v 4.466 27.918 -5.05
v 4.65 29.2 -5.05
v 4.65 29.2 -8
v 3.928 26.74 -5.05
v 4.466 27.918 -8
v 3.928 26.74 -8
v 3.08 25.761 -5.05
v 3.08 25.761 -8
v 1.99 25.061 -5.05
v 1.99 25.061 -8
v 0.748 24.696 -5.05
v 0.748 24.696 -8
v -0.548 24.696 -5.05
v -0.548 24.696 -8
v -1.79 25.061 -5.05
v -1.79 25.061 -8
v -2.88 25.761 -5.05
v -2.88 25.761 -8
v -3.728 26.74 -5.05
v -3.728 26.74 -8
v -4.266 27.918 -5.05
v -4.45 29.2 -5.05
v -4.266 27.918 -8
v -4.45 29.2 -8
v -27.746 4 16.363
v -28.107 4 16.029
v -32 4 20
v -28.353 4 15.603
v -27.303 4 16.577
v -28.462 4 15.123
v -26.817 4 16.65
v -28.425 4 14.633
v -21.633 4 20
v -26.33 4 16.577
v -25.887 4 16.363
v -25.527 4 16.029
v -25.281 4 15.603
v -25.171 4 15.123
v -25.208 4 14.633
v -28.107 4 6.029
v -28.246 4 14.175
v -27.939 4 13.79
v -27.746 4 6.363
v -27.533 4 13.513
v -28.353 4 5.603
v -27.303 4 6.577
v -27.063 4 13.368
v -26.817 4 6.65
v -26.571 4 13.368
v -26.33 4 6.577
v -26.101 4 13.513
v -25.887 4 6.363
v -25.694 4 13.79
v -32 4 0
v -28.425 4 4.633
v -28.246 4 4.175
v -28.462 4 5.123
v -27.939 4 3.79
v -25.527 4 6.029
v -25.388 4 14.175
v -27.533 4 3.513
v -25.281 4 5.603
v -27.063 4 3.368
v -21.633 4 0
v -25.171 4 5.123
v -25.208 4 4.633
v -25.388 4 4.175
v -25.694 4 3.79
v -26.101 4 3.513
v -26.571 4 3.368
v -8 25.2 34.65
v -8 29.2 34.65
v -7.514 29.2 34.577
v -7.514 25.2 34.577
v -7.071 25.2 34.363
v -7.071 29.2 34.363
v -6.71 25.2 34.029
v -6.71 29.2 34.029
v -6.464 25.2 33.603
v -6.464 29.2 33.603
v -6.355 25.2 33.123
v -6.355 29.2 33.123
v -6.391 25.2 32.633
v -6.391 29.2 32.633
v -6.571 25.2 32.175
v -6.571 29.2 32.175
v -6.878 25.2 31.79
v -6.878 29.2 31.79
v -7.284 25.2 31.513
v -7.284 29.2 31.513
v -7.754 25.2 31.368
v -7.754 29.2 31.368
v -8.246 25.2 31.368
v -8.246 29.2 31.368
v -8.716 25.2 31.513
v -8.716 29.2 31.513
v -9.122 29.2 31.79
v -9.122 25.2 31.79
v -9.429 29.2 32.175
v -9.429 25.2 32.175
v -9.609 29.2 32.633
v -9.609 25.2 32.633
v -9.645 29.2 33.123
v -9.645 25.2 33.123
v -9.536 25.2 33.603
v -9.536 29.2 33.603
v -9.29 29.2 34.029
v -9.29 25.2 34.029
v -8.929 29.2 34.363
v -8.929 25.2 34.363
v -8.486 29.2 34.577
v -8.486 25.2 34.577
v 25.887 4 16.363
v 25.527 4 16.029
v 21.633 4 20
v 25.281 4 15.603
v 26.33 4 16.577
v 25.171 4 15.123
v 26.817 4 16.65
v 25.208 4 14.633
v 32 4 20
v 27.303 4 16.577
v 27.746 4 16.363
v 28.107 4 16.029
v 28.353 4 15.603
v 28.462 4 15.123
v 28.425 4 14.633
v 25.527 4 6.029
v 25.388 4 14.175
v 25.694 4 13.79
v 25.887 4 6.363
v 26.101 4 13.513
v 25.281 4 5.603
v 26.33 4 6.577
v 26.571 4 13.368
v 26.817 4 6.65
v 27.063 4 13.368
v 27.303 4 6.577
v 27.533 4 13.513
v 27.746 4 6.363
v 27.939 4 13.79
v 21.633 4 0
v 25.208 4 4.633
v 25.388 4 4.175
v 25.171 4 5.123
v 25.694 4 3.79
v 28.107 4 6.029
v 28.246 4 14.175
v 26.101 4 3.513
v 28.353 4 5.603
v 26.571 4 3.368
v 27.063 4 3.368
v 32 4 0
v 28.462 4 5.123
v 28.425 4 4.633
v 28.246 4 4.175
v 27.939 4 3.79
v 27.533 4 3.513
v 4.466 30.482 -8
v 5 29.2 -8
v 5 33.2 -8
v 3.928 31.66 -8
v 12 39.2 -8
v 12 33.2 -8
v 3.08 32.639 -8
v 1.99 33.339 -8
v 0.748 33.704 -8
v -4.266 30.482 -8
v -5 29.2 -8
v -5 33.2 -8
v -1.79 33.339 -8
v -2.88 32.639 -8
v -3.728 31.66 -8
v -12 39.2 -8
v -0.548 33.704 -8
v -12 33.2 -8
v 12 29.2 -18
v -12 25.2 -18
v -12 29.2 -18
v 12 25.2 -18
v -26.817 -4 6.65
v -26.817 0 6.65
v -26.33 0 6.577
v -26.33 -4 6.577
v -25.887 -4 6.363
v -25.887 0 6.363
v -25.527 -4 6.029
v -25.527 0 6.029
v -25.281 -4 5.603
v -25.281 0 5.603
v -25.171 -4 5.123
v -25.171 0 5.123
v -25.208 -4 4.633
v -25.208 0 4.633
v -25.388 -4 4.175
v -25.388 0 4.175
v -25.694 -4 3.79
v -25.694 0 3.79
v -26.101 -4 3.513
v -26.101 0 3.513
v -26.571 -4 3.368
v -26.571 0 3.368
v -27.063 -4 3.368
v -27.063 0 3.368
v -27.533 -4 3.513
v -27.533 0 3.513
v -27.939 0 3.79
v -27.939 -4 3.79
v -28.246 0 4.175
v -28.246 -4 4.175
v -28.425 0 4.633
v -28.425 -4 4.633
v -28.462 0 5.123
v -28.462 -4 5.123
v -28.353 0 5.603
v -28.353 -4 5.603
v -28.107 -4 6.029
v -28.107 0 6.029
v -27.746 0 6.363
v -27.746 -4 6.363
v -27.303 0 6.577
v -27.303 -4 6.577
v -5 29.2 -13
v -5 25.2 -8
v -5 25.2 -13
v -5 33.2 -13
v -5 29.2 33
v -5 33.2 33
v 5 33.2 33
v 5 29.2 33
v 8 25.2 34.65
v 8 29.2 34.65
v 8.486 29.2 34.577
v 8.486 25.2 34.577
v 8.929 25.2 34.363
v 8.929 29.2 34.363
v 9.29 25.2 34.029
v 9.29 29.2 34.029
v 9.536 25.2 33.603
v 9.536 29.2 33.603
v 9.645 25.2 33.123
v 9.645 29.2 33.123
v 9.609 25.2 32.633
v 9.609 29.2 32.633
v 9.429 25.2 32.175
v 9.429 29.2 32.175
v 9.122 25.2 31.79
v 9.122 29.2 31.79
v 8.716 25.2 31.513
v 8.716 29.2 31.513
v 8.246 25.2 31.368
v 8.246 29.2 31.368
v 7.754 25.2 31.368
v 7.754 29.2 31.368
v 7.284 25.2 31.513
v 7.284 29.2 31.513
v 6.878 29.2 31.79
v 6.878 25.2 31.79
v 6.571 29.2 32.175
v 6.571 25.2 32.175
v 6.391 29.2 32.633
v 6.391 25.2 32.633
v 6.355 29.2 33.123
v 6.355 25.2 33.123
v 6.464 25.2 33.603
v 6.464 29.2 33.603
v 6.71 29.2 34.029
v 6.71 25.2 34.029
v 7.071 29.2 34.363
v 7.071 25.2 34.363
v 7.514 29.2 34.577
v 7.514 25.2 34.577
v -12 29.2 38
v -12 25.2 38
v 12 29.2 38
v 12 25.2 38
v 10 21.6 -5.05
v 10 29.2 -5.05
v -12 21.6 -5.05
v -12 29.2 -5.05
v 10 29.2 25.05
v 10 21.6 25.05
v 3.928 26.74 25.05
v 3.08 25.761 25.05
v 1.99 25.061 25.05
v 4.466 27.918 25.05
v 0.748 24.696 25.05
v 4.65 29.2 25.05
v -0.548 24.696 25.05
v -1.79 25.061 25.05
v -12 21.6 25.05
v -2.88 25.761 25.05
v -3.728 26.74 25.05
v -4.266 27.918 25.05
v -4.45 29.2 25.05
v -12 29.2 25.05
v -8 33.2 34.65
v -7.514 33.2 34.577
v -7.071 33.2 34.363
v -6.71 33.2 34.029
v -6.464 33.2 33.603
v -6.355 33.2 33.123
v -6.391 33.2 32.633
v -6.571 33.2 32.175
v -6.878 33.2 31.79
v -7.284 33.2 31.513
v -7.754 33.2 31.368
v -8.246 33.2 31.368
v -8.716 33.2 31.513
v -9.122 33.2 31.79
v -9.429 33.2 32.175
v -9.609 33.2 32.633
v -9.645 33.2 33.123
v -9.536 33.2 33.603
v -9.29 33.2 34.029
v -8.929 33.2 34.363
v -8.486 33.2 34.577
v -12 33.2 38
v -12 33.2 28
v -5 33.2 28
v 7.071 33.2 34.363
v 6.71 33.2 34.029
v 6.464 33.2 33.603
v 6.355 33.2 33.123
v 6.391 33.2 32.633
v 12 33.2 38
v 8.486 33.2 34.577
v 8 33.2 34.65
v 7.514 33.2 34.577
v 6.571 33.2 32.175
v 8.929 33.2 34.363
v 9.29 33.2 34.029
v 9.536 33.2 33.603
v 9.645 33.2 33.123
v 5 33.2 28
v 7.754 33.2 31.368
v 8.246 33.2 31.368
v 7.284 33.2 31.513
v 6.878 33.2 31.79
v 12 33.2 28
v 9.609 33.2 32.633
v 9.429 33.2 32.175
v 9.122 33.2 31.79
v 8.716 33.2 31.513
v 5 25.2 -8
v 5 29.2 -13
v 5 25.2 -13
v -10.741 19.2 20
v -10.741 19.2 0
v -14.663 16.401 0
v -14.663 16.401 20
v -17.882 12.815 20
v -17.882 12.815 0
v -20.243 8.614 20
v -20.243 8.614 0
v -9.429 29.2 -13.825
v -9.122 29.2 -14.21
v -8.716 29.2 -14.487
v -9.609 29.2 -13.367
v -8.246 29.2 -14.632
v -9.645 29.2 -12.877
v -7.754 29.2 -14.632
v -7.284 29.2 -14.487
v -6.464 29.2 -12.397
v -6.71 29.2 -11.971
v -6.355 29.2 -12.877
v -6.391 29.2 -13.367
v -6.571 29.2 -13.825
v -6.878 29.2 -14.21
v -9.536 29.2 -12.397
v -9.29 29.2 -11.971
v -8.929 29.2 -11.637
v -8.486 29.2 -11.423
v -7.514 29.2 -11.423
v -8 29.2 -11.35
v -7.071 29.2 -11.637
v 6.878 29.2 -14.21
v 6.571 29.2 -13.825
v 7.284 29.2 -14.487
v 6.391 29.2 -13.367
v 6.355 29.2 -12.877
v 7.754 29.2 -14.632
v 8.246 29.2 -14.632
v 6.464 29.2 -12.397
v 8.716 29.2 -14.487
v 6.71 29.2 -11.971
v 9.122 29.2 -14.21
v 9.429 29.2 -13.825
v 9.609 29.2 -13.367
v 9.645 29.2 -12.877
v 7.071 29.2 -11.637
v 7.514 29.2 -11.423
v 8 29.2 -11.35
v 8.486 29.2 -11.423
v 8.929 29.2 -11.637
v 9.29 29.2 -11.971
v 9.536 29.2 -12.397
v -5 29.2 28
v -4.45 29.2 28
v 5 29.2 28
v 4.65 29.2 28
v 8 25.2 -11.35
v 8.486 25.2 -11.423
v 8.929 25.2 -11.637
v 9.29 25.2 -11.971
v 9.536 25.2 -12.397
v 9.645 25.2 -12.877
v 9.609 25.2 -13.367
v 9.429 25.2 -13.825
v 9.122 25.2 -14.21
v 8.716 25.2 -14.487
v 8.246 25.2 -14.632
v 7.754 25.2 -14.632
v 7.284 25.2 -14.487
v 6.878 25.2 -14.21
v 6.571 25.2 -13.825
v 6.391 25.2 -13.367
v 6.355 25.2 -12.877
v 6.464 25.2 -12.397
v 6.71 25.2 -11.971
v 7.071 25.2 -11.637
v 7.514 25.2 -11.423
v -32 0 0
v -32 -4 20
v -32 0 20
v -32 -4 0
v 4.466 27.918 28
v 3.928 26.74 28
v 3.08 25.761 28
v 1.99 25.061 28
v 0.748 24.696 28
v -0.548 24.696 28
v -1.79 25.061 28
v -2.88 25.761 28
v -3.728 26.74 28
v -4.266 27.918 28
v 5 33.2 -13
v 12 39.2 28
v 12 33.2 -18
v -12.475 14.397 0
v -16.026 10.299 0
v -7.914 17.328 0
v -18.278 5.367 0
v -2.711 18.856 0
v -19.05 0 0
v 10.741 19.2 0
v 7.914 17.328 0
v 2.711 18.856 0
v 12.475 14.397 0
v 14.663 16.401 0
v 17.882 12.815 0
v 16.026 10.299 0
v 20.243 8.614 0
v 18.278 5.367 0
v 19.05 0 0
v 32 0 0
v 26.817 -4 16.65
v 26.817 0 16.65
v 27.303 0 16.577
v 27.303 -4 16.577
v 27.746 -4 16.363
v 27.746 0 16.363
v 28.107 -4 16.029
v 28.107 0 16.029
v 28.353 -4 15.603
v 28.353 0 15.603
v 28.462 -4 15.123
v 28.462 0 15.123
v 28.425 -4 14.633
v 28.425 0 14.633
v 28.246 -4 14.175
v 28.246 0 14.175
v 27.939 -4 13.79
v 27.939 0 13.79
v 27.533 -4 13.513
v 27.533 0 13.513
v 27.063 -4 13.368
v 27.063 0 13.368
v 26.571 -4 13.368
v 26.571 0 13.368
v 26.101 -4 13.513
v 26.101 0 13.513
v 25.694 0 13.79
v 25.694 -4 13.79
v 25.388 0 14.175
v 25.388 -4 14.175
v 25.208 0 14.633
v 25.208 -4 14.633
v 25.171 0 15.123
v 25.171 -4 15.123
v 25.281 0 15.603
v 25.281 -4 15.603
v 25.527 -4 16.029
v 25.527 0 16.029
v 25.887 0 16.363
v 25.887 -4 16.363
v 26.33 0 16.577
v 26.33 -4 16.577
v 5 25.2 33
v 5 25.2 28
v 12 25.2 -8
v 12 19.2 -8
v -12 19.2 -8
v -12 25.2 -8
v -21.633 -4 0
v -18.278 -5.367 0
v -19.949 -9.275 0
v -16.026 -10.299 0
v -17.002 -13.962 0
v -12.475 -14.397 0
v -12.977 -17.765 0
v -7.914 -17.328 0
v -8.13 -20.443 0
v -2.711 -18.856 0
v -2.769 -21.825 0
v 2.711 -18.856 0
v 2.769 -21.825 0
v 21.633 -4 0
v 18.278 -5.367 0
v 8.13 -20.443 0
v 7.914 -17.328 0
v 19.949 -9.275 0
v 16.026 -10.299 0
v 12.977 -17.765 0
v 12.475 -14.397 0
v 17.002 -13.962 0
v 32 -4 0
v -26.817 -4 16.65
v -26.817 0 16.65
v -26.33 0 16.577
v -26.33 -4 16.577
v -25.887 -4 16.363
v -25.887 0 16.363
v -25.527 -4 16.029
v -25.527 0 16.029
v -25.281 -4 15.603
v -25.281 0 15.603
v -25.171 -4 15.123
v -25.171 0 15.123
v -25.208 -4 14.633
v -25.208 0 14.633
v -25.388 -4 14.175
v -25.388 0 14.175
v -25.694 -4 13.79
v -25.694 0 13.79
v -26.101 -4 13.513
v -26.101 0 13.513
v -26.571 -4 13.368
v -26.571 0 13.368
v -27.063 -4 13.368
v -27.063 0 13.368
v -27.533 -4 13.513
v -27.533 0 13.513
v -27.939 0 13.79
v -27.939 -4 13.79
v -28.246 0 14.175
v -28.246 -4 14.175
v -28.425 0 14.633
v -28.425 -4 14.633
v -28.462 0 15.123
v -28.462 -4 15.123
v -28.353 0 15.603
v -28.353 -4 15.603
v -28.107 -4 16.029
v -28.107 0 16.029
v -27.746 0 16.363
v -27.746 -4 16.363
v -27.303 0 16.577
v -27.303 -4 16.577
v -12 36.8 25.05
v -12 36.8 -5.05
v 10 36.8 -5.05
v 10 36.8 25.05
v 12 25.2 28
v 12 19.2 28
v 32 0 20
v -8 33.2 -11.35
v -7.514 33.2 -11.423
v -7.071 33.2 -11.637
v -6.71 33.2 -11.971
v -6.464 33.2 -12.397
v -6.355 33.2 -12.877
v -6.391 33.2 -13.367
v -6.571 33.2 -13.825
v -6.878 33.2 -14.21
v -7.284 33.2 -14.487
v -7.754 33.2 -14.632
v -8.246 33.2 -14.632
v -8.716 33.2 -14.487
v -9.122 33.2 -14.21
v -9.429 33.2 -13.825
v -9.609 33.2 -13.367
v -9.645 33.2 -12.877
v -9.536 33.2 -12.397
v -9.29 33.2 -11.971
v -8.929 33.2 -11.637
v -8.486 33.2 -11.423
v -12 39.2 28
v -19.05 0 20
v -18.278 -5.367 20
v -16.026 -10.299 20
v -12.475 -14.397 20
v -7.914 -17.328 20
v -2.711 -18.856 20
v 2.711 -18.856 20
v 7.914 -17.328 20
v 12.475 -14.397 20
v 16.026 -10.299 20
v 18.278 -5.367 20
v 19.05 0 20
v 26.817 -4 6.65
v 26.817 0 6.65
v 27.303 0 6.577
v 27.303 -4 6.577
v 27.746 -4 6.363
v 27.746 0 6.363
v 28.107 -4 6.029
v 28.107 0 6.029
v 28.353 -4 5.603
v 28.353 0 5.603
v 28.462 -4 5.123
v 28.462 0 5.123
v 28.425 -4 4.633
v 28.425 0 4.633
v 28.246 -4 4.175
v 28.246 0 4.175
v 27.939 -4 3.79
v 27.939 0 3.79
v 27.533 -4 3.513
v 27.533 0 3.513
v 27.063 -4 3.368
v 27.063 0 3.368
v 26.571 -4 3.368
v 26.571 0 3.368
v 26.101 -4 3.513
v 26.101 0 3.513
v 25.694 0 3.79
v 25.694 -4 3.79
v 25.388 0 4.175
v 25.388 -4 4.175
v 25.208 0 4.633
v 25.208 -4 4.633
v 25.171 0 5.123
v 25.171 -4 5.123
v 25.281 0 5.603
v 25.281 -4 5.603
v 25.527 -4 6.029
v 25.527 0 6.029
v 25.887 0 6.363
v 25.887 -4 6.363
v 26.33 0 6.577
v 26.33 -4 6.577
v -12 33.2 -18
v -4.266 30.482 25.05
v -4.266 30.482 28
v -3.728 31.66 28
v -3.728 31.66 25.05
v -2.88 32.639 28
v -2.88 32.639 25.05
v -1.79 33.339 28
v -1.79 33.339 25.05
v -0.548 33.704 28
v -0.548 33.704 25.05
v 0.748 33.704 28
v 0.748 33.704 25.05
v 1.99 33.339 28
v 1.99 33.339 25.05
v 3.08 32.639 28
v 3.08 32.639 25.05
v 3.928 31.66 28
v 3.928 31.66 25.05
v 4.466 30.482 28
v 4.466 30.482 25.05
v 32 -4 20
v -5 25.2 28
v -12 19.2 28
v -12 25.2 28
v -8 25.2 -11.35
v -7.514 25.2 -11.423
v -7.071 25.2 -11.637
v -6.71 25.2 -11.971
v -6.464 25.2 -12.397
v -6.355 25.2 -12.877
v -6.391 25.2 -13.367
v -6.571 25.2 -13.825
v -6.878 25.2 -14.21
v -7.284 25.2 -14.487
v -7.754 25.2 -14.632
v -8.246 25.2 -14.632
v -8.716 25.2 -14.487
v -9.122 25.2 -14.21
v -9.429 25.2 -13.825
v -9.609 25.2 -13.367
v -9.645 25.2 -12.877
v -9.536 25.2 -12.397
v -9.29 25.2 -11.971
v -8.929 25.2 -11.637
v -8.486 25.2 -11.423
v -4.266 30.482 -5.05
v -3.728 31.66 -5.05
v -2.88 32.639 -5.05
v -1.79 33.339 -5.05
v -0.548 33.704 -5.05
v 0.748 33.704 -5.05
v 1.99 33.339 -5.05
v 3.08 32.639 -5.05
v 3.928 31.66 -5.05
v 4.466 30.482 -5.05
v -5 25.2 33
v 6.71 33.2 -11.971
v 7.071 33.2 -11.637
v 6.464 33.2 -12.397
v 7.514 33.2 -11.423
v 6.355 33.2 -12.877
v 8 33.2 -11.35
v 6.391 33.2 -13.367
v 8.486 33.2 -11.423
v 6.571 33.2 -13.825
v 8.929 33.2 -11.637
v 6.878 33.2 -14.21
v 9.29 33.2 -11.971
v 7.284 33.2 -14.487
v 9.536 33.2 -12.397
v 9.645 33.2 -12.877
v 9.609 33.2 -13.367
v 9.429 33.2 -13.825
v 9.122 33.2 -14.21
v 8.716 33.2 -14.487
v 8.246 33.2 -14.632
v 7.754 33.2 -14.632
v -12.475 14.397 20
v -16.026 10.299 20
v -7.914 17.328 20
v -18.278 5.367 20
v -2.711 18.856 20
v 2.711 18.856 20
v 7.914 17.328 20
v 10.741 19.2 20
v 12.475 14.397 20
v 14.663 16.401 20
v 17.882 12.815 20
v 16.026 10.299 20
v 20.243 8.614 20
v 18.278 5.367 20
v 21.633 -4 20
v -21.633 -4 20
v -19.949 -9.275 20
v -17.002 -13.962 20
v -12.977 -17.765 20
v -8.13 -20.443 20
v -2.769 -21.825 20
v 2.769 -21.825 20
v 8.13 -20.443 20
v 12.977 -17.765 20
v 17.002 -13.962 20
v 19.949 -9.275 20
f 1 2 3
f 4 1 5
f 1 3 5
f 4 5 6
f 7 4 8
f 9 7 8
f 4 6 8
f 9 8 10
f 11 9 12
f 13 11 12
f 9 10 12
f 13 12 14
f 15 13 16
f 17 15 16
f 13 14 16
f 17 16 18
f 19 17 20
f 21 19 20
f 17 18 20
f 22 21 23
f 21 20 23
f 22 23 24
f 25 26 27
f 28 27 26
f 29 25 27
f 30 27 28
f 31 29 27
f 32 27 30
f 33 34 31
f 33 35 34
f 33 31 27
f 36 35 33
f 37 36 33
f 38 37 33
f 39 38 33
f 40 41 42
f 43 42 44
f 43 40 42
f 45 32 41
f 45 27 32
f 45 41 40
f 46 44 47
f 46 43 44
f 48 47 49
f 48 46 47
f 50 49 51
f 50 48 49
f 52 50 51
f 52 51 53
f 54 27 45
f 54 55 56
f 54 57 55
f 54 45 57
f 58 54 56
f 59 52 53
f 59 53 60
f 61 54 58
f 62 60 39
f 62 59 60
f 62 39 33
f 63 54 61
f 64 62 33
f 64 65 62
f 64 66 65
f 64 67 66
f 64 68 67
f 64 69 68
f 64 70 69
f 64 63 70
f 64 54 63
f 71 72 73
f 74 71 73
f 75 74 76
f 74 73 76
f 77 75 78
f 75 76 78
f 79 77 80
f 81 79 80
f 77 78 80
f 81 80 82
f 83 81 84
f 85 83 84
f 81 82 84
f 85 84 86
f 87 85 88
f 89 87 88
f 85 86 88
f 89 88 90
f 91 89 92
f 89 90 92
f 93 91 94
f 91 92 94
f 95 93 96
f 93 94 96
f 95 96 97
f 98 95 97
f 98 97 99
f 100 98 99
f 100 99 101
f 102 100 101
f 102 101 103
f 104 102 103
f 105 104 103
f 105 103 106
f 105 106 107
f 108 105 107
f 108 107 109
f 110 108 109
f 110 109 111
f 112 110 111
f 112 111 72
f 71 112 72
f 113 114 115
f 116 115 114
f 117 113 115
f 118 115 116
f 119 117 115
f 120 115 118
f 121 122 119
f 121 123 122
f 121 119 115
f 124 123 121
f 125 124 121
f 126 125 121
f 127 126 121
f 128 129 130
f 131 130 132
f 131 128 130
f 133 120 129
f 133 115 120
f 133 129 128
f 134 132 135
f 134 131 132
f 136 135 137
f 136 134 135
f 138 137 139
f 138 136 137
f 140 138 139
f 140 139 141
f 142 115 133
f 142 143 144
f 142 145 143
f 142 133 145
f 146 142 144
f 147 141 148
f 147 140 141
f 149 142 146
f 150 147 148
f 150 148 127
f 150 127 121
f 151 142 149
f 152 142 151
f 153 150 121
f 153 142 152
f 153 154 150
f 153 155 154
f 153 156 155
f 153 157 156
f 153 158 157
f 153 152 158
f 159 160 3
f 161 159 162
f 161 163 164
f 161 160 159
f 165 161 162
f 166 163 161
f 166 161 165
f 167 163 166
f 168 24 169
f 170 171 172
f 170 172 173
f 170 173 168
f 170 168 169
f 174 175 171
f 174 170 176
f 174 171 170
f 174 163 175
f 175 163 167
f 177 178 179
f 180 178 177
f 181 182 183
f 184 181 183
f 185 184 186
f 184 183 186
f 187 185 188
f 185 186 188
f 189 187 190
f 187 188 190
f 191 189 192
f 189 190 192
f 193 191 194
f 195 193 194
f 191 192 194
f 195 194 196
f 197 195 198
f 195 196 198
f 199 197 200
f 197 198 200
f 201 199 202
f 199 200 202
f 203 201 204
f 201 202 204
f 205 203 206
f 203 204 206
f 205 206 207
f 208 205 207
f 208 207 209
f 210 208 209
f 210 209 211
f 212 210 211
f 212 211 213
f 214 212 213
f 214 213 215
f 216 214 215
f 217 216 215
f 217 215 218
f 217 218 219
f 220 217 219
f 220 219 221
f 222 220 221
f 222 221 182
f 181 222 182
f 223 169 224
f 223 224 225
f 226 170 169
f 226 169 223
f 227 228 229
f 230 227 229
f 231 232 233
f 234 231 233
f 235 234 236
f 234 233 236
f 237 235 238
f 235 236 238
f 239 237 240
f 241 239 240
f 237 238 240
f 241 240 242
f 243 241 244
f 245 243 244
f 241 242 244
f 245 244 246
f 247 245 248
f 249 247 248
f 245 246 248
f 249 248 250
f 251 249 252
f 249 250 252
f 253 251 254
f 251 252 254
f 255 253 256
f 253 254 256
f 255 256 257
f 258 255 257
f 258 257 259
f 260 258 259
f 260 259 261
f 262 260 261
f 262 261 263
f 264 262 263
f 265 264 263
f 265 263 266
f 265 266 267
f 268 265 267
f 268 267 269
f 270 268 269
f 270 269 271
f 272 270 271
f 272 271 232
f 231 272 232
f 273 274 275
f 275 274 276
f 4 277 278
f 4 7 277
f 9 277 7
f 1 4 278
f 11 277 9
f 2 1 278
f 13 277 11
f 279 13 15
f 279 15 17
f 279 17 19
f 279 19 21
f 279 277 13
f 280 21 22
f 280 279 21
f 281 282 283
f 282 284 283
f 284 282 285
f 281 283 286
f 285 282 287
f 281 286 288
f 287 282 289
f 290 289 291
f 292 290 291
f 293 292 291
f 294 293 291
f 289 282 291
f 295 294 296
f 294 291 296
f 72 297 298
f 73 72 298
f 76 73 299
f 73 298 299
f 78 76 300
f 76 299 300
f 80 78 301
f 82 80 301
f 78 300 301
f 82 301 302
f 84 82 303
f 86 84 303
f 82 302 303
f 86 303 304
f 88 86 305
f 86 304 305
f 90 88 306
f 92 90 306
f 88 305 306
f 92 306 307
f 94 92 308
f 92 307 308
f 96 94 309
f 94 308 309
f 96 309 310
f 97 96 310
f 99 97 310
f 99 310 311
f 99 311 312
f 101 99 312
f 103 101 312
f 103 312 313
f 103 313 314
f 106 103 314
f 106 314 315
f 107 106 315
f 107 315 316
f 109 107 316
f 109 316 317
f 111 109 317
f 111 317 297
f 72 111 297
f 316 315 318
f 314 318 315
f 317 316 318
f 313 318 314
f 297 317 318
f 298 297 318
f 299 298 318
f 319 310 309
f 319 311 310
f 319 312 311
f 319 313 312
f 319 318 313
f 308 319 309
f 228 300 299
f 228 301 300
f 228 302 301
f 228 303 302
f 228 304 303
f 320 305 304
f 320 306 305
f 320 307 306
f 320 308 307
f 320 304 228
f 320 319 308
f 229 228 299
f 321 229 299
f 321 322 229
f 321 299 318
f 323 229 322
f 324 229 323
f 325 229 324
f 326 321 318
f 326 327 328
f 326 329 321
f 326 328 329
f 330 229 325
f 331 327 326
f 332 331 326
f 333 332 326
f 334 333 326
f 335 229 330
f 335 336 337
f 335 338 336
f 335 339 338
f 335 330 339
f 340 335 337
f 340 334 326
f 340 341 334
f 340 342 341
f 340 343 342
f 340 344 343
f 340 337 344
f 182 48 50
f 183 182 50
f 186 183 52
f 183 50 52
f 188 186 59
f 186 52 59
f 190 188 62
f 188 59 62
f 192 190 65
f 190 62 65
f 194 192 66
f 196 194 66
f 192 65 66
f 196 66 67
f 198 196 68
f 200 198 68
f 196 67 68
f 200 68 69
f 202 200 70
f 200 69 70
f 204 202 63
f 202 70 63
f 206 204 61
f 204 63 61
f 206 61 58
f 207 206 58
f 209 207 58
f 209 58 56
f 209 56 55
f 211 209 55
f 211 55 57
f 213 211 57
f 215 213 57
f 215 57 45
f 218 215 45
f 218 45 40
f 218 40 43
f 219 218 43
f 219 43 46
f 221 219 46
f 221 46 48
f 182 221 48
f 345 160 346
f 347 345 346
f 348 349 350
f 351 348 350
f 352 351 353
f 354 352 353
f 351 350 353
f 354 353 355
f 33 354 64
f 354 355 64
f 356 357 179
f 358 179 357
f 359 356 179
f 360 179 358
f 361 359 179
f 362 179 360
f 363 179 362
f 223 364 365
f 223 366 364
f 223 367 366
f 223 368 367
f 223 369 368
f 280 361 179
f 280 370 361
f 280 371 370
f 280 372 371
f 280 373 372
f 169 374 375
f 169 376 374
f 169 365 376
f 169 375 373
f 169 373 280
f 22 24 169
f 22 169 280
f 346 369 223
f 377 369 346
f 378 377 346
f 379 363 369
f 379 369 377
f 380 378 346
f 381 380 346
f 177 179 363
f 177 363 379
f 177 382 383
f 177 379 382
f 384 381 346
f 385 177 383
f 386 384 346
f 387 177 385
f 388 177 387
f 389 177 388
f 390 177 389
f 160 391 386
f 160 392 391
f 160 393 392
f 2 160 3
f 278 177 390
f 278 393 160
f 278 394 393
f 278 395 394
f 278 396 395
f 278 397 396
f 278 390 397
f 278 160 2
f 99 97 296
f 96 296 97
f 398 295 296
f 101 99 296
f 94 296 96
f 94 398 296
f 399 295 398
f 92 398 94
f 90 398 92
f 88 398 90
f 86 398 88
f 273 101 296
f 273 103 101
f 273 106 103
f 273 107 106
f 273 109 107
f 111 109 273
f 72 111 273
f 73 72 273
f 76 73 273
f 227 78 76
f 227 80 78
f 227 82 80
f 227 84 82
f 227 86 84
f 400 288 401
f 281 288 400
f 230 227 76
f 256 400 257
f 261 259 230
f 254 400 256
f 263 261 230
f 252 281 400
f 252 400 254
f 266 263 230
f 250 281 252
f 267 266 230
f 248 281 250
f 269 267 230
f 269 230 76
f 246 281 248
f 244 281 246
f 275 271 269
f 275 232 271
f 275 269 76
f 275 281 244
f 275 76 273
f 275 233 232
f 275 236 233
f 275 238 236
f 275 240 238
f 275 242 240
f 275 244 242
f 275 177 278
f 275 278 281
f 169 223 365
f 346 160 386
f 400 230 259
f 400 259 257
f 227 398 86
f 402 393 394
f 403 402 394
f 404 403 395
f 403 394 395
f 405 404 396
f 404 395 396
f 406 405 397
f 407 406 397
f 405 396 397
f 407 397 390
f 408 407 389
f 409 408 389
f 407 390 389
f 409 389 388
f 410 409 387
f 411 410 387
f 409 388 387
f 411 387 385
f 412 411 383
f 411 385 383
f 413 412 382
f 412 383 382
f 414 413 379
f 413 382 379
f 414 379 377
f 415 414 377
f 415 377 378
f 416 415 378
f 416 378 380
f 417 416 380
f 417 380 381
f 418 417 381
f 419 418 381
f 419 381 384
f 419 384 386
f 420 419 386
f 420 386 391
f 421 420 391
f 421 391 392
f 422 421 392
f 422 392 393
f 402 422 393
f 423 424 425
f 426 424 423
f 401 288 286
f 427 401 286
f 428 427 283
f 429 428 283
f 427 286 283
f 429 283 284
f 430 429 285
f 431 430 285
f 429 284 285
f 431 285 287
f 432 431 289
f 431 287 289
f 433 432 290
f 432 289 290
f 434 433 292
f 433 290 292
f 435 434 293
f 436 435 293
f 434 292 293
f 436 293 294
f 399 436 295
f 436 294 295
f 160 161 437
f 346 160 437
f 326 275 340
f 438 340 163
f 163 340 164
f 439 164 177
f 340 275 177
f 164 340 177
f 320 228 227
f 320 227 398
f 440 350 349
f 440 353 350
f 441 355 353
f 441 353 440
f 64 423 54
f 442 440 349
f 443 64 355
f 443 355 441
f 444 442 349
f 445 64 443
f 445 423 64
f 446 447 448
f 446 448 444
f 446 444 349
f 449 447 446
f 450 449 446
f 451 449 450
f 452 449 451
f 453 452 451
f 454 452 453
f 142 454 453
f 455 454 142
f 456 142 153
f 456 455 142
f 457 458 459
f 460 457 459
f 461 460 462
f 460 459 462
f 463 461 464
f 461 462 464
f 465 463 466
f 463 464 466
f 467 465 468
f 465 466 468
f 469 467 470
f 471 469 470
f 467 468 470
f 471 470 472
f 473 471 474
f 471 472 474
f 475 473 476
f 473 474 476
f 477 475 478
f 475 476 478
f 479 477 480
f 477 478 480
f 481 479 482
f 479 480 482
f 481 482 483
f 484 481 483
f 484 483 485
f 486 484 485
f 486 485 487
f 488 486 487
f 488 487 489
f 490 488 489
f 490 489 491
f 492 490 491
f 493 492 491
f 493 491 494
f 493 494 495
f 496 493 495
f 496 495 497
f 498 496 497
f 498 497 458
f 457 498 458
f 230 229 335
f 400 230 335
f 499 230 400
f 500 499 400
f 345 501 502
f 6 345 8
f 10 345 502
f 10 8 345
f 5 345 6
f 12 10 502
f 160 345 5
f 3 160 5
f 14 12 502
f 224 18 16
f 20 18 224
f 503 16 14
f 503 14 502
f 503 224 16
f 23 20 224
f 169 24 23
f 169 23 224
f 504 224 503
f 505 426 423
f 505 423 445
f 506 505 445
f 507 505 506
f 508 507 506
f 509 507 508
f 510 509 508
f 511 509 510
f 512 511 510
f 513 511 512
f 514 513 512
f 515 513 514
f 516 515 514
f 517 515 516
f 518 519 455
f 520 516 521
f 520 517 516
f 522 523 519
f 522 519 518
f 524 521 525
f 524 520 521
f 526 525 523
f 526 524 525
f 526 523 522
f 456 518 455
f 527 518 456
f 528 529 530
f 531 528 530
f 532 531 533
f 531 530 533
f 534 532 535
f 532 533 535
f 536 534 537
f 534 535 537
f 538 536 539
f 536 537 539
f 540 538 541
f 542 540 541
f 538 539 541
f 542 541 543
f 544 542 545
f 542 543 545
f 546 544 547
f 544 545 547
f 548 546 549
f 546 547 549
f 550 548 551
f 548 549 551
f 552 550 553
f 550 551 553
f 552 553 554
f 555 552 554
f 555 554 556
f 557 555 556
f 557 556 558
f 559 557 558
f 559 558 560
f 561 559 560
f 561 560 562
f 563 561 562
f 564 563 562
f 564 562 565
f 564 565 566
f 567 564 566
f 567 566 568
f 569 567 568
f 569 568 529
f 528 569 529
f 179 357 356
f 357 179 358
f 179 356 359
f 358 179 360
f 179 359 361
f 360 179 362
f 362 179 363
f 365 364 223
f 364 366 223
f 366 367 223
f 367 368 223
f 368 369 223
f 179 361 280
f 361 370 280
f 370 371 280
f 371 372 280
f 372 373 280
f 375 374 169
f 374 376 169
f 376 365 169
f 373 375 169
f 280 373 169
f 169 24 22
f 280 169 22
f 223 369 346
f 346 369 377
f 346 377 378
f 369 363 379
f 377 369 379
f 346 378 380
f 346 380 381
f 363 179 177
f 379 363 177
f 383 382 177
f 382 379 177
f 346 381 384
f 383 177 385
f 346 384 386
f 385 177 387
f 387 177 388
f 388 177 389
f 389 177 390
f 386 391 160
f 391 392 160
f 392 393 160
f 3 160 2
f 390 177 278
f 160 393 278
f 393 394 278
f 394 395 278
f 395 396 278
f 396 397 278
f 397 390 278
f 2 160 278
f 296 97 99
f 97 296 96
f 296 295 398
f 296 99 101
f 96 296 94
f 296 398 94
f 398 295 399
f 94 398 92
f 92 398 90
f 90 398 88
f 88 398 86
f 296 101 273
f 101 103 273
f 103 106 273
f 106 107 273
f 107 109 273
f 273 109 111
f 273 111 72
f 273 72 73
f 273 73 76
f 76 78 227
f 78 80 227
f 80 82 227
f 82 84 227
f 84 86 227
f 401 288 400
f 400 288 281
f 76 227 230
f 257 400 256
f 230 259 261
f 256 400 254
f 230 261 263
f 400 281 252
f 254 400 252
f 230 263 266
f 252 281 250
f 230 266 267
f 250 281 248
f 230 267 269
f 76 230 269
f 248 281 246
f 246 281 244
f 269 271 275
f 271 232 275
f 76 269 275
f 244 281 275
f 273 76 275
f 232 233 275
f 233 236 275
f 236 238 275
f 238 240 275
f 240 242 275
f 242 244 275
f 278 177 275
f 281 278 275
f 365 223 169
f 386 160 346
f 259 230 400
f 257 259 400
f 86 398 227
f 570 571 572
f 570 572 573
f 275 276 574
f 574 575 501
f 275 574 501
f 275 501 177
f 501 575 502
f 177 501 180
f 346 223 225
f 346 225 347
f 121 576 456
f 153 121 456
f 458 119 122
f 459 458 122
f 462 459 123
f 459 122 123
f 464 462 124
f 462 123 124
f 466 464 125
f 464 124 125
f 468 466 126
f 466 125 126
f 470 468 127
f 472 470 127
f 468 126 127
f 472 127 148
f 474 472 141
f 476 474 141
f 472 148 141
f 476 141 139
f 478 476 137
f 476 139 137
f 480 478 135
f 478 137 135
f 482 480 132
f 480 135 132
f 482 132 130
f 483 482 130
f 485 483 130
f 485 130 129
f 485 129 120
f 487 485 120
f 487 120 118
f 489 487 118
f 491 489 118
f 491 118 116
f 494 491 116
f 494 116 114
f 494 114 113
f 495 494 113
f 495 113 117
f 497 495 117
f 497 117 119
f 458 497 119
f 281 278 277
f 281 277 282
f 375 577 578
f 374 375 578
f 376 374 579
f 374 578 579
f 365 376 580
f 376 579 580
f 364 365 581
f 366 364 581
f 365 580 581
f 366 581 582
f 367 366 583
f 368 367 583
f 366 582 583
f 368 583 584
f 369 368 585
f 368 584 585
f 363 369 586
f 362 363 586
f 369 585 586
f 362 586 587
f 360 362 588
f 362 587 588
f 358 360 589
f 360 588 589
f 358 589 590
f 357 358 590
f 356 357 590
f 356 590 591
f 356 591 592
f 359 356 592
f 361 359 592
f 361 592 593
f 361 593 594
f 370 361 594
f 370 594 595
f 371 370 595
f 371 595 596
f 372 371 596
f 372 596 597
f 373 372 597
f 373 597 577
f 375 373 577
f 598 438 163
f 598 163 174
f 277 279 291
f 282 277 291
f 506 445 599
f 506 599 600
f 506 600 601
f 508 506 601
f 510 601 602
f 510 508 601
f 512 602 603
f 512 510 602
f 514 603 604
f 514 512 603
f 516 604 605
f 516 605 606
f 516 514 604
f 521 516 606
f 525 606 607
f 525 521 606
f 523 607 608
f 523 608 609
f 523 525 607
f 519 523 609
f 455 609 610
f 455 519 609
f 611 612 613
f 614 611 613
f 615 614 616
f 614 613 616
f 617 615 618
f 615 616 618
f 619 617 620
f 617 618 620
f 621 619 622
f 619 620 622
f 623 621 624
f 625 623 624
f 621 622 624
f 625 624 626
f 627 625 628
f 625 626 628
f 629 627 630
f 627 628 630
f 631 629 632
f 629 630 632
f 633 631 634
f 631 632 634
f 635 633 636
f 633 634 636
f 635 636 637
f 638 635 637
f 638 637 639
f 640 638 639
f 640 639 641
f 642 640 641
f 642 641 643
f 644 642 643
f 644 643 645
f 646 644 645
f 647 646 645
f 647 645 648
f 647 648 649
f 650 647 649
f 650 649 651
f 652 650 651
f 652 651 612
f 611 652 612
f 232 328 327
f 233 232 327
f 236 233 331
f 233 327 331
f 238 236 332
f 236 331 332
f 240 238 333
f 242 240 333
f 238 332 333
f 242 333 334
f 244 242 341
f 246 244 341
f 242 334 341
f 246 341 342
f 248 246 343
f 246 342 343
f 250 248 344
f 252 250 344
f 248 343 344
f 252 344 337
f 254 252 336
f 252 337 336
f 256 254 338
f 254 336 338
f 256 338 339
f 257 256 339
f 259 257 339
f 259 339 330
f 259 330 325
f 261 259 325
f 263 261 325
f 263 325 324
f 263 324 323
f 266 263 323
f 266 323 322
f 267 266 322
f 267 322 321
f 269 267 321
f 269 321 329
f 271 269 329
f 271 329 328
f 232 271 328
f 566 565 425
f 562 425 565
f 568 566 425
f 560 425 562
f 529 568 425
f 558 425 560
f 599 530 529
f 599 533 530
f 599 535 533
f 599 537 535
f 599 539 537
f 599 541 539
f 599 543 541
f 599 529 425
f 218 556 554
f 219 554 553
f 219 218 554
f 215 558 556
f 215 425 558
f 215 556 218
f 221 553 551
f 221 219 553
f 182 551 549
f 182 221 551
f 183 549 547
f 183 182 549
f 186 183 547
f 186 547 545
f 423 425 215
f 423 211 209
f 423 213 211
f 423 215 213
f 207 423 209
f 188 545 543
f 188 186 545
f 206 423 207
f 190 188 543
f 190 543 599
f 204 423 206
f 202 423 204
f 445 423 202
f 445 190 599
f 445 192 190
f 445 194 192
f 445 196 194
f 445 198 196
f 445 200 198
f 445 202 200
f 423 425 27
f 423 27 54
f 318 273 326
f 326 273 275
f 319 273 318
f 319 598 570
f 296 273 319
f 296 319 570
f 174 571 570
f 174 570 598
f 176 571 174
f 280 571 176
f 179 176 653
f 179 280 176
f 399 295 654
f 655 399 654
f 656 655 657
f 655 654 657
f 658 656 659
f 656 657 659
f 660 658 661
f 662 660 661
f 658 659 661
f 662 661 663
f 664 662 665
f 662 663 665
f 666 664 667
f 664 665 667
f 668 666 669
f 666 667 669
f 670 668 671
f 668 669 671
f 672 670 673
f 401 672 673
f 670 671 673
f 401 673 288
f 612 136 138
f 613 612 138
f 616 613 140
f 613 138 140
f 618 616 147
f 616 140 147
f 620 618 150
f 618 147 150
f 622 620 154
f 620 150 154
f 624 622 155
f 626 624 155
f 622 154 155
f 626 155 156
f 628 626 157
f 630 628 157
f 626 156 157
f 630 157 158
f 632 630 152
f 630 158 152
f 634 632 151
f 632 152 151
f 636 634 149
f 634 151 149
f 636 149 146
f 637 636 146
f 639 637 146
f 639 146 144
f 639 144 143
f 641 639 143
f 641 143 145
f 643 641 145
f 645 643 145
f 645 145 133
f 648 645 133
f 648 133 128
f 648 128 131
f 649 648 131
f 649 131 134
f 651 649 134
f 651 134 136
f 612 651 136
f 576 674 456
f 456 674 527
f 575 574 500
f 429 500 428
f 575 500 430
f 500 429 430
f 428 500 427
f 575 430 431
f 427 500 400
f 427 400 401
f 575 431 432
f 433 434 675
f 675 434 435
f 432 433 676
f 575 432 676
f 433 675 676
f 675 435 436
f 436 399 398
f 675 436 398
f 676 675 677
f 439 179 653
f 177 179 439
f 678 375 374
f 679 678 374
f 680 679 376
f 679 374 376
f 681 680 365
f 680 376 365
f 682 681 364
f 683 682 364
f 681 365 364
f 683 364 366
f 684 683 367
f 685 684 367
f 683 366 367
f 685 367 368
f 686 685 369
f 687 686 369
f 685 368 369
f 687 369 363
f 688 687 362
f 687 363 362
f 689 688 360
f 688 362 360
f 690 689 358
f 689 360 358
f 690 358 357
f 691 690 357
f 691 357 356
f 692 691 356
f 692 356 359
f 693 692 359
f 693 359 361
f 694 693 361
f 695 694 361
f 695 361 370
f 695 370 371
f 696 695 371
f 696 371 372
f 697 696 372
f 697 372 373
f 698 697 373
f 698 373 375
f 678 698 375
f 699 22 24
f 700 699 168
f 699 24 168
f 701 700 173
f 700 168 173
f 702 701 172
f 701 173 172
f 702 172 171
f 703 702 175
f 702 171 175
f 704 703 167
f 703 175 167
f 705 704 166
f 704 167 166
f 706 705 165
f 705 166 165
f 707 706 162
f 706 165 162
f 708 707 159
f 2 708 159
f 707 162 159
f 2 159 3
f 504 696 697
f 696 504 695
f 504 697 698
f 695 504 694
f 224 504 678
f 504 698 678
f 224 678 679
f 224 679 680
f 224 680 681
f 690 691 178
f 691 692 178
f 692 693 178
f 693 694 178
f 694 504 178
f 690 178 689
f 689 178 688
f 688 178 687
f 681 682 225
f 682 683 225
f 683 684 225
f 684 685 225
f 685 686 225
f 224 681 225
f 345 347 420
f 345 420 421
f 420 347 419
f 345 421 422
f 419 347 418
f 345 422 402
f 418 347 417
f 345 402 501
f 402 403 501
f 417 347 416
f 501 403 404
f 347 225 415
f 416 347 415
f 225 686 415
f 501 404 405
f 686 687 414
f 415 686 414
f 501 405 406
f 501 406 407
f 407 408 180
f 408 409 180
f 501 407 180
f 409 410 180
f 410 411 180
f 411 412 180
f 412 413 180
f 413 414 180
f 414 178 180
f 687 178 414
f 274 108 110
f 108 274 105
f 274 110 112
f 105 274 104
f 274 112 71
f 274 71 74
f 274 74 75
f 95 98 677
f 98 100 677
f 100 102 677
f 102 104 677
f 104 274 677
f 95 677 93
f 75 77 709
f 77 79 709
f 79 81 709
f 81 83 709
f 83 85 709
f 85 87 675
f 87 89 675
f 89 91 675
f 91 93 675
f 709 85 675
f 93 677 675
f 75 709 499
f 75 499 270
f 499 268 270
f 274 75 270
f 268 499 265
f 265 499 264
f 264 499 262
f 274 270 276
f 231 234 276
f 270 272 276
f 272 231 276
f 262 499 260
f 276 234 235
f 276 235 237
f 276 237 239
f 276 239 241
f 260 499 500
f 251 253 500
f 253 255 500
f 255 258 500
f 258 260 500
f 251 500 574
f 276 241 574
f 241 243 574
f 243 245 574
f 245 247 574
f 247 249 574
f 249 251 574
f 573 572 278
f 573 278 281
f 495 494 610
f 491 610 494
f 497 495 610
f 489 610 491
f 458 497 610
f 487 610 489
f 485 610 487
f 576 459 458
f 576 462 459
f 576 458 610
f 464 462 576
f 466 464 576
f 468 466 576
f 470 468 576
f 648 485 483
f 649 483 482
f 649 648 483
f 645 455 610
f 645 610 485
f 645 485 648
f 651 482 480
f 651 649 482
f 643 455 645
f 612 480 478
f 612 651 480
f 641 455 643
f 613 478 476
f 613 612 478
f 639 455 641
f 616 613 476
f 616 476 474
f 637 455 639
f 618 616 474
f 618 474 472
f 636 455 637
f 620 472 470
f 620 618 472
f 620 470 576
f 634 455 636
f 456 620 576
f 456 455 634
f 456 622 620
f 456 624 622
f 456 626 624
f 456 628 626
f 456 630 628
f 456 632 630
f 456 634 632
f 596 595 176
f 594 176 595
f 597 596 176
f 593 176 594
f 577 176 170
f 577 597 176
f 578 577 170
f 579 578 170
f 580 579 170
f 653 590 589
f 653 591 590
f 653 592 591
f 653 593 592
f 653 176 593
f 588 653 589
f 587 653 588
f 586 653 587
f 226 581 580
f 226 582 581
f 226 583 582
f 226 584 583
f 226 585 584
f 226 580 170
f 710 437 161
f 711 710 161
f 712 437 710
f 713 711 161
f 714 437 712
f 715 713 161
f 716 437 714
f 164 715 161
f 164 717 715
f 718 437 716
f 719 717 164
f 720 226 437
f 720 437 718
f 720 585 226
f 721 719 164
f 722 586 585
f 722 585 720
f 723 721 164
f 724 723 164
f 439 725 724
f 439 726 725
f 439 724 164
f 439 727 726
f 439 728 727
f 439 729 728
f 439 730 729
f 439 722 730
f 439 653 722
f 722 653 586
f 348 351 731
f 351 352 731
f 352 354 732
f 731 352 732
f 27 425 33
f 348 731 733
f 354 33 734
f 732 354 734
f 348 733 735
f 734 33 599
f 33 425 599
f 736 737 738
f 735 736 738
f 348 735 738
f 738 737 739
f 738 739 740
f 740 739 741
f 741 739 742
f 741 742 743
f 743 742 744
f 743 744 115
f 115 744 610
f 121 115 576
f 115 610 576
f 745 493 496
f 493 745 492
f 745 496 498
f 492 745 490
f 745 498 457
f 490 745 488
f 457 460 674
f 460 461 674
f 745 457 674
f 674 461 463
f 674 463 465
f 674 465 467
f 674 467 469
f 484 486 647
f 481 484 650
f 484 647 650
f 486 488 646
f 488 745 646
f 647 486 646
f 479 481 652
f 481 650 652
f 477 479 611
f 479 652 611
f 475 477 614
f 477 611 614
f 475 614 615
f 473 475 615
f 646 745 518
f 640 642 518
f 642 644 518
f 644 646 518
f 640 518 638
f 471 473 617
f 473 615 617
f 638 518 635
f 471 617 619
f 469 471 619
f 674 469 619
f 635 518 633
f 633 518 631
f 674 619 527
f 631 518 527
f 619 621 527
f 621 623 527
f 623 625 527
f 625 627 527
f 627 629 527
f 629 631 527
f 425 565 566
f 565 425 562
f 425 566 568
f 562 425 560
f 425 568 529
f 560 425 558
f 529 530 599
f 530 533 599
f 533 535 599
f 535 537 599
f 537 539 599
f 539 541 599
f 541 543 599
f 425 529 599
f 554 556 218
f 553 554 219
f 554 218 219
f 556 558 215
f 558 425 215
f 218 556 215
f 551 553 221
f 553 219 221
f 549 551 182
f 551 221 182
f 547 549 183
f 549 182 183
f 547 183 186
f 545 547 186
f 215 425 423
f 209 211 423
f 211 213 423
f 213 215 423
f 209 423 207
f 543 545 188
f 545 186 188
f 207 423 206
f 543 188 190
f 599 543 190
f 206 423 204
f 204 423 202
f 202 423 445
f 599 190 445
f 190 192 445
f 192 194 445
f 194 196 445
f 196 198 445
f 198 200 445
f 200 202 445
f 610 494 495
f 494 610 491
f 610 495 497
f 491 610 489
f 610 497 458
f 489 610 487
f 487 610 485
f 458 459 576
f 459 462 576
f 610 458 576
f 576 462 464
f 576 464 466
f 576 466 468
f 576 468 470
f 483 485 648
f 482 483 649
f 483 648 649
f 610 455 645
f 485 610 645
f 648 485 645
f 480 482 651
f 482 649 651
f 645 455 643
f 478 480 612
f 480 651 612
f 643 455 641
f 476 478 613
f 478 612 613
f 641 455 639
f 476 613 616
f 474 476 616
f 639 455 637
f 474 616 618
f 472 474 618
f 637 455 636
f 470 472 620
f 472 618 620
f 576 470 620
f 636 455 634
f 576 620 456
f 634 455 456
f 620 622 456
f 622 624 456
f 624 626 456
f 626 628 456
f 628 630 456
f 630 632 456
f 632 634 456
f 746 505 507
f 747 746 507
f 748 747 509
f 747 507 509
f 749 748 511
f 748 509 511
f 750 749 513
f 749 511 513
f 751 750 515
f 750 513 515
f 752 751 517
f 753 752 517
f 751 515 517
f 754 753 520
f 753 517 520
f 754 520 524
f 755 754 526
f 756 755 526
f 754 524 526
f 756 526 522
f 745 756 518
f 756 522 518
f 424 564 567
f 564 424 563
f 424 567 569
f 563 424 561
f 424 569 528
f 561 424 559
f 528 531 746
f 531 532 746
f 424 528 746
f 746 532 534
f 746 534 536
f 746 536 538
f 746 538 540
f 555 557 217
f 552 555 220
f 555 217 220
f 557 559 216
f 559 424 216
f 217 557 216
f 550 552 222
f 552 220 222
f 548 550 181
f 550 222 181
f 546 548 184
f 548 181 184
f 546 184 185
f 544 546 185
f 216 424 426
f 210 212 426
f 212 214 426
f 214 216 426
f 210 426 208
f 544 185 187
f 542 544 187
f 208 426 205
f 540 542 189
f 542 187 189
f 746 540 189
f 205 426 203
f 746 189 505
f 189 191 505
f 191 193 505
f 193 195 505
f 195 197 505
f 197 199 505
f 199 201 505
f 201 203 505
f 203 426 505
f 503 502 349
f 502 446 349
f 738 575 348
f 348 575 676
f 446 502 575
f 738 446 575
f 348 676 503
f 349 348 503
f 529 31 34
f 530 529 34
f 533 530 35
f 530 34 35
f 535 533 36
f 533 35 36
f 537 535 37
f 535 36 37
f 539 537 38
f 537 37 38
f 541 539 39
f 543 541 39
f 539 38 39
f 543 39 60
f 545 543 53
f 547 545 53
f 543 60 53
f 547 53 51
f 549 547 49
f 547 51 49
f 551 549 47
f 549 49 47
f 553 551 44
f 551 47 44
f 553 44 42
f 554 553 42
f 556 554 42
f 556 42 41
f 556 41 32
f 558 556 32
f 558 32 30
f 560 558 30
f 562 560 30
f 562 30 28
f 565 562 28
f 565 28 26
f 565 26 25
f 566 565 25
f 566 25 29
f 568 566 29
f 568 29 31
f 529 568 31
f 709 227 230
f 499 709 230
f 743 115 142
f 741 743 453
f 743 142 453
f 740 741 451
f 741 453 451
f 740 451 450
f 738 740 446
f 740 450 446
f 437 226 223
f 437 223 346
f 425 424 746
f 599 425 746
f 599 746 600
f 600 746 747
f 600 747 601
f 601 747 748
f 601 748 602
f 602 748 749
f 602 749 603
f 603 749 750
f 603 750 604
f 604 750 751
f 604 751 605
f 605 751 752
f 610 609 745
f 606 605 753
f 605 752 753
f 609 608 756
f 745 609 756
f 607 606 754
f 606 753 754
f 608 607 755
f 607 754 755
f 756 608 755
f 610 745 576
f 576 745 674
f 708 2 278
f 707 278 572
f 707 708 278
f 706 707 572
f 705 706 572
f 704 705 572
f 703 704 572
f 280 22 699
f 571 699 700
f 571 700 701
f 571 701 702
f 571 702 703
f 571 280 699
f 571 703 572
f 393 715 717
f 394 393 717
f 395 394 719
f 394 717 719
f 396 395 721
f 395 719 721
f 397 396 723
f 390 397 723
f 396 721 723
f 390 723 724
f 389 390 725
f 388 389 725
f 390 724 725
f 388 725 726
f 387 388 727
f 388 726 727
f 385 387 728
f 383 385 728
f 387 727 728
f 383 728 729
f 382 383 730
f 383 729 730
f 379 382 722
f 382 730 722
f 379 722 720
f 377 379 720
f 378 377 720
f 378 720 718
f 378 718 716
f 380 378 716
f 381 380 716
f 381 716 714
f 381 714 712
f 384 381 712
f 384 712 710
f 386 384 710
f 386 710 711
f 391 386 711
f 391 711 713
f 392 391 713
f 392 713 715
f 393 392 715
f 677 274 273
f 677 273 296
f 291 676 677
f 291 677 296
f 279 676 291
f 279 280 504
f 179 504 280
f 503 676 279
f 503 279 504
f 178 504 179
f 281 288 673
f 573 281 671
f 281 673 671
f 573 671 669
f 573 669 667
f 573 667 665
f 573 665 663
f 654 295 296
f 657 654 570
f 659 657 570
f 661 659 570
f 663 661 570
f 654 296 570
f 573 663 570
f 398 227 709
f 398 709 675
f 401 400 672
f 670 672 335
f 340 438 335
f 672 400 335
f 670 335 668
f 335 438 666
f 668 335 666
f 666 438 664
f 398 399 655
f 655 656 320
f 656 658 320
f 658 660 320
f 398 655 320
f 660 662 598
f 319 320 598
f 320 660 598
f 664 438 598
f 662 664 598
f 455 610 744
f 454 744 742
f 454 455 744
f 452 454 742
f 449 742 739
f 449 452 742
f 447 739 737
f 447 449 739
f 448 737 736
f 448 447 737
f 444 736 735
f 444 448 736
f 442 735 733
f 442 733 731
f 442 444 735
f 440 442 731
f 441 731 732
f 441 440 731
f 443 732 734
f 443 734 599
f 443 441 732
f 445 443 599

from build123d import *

# Parameters (mm, degrees)
SKETCH_1_R           = 22
SKETCH_1_R_2         = 19.05
EXTRUDE_1_DEPTH      = 20
EXTRUDE_2_DEPTH      = 4
EXTRUDE_2_DEPTH_BACK = 4
SKETCH_2_W           = 12
SKETCH_2_H           = 20
CUT_EXTRUDE_1_REACH  = 47.826
SKETCH_3_R           = 1.65
EXTRUDE_3_DEPTH      = 8
EXTRUDE_3_DEPTH_BACK = 28
SKETCH_4_W           = 24
SKETCH_4_H           = 20
SKETCH_5_W           = 30.1
SKETCH_5_H           = 15.2
CUT_EXTRUDE_2_DEPTH  = 22
CUT_EXTRUDE_3_REACH  = 64.102
SKETCH_6_R           = 4.55
EXTRUDE_4_DEPTH      = 4
EXTRUDE_4_DEPTH_BACK = 4
SKETCH_7_W           = 24
SKETCH_7_H           = 10
CUT_EXTRUDE_4_REACH  = 76.263
SKETCH_8_R           = 1.65
SKETCH_8_W           = 10
SKETCH_8_H           = 5


# Read off the part's stored shape, not the designer's step: 部品分割2
with BuildPart() as part:
    # ｽｹｯﾁ1 → ﾎﾞｽ - 押し出し1 (new body)
    with BuildSketch(Plane.XY):
        Circle(SKETCH_1_R)
        Circle(SKETCH_1_R_2, mode=Mode.SUBTRACT)
    extrude(amount=EXTRUDE_1_DEPTH)

    # ｽｹｯﾁ2 → ﾎﾞｽ - 押し出し2 (add, two sides: drawn at the far end of the back side and taken through both)
    with BuildSketch(Plane(origin=(0, 0, 0), x_dir=(1, 0, 0), z_dir=(0, 1, 0)).offset(-EXTRUDE_2_DEPTH_BACK)):
        with Locations((-26, -10)):
            Rectangle(SKETCH_2_W, SKETCH_2_H)
        with Locations((26, -10)):
            Rectangle(SKETCH_2_W, SKETCH_2_H)
    extrude(amount=EXTRUDE_2_DEPTH + EXTRUDE_2_DEPTH_BACK)

    # ｽｹｯﾁ3 → ｶｯﾄ - 押し出し1 (cut, up to next)
    with BuildSketch(Plane(origin=(0, 4, 0), x_dir=(1, 0, 0), z_dir=(0, 1, 0)), mode=Mode.PRIVATE) as cut_extrude_1_sk1:
        with Locations(Location((-26.816653826, -5, 0), (0, 0, 270))):
            Circle(SKETCH_3_R)
    cut_extrude_1_tool1 = extrude(cut_extrude_1_sk1.sketch, amount=-CUT_EXTRUDE_1_REACH, mode=Mode.PRIVATE) & part.part
    # ｽｹｯﾁ3 → ｶｯﾄ - 押し出し1 (cut, up to next)
    with BuildSketch(Plane(origin=(0, 4, 0), x_dir=(1, 0, 0), z_dir=(0, 1, 0)), mode=Mode.PRIVATE) as cut_extrude_1_sk2:
        with Locations(Location((-26.816653826, -15, 0), (0, 0, 270))):
            Circle(SKETCH_3_R)
    cut_extrude_1_tool2 = extrude(cut_extrude_1_sk2.sketch, amount=-CUT_EXTRUDE_1_REACH, mode=Mode.PRIVATE) & part.part
    # ｽｹｯﾁ3 → ｶｯﾄ - 押し出し1 (cut, up to next)
    with BuildSketch(Plane(origin=(0, 4, 0), x_dir=(1, 0, 0), z_dir=(0, 1, 0)), mode=Mode.PRIVATE) as cut_extrude_1_sk3:
        with Locations(Location((26.816653826, -15, 0), (0, 0, 270))):
            Circle(SKETCH_3_R)
    cut_extrude_1_tool3 = extrude(cut_extrude_1_sk3.sketch, amount=-CUT_EXTRUDE_1_REACH, mode=Mode.PRIVATE) & part.part
    # ｽｹｯﾁ3 → ｶｯﾄ - 押し出し1 (cut, up to next)
    with BuildSketch(Plane(origin=(0, 4, 0), x_dir=(1, 0, 0), z_dir=(0, 1, 0)), mode=Mode.PRIVATE) as cut_extrude_1_sk4:
        with Locations(Location((26.816653826, -5, 0), (0, 0, 270))):
            Circle(SKETCH_3_R)
    cut_extrude_1_tool4 = extrude(cut_extrude_1_sk4.sketch, amount=-CUT_EXTRUDE_1_REACH, mode=Mode.PRIVATE) & part.part
    add(cut_extrude_1_tool1.solids().sort_by_distance((-26.816654, 4, 5))[0], mode=Mode.SUBTRACT)
    add(cut_extrude_1_tool2.solids().sort_by_distance((-26.816654, 4, 15))[0], mode=Mode.SUBTRACT)
    add(cut_extrude_1_tool3.solids().sort_by_distance((26.816654, 4, 15))[0], mode=Mode.SUBTRACT)
    add(cut_extrude_1_tool4.solids().sort_by_distance((26.816654, 4, 5))[0], mode=Mode.SUBTRACT)

    # ｽｹｯﾁ4 → ﾎﾞｽ - 押し出し3 (add, two sides: drawn at the far end of the back side and taken through both)
    with BuildSketch(Plane(origin=(0, 0, 0), x_dir=(-1, 0, 0), z_dir=(0, 0, -1)).offset(-EXTRUDE_3_DEPTH_BACK)):
        with Locations((0, 29.2)):
            Rectangle(SKETCH_4_W, SKETCH_4_H)
    extrude(amount=EXTRUDE_3_DEPTH + EXTRUDE_3_DEPTH_BACK)

    # ｽｹｯﾁ5 → ｶｯﾄ - 押し出し2 (cut)
    with BuildSketch(Plane.ZY.offset(12)):
        with Locations((10, 29.2)):
            Rectangle(SKETCH_5_W, SKETCH_5_H)
    extrude(amount=-CUT_EXTRUDE_2_DEPTH, mode=Mode.SUBTRACT)

    # ｶｯﾄ - 押し出し3: up to this face of the body (flat: up to its plane)
    cut_extrude_3_end = Plane(part.part.faces().sort_by_distance((0, 29.2, 28))[0])
    # ｽｹｯﾁ6 → ｶｯﾄ - 押し出し3 (cut, up to the picked face)
    with BuildSketch(Plane(origin=(0, 0, -8), x_dir=(-1, 0, 0), z_dir=(0, 0, -1)), mode=Mode.PRIVATE) as cut_extrude_3_sk1:
        with Locations((-0.1, 29.2)):
            Circle(SKETCH_6_R)
    cut_extrude_3_tool1 = split(extrude(cut_extrude_3_sk1.sketch, amount=-CUT_EXTRUDE_3_REACH, mode=Mode.PRIVATE), bisect_by=cut_extrude_3_end, keep=Keep.BOTH, mode=Mode.PRIVATE)
    add(cut_extrude_3_tool1.solids().sort_by(Axis((0.1, 29.2, -8), (0, 0, 1)))[0], mode=Mode.SUBTRACT)

    # ｽｹｯﾁ7 → ﾎﾞｽ - 押し出し4 (add, two sides: drawn at the far end of the back side and taken through both)
    with BuildSketch(Plane(origin=(0, 29.2, 0), x_dir=(1, 0, 0), z_dir=(0, 1, 0)).offset(-EXTRUDE_4_DEPTH_BACK)):
        with Locations((0, 13)):
            Rectangle(SKETCH_7_W, SKETCH_7_H)
        with Locations((0, -33)):
            Rectangle(SKETCH_7_W, SKETCH_7_H)
    extrude(amount=EXTRUDE_4_DEPTH + EXTRUDE_4_DEPTH_BACK)

    # ｽｹｯﾁ8 → ｶｯﾄ - 押し出し4 (cut, up to next)
    with BuildSketch(Plane(origin=(0, 33.2, 0), x_dir=(1, 0, 0), z_dir=(0, 1, 0)), mode=Mode.PRIVATE) as cut_extrude_4_sk1:
        with Locations(Location((-8, 13, 0), (0, 0, 270))):
            Circle(SKETCH_8_R)
    cut_extrude_4_tool1 = extrude(cut_extrude_4_sk1.sketch, amount=-CUT_EXTRUDE_4_REACH, mode=Mode.PRIVATE) & part.part
    # ｽｹｯﾁ8 → ｶｯﾄ - 押し出し4 (cut, up to next)
    with BuildSketch(Plane(origin=(0, 33.2, 0), x_dir=(1, 0, 0), z_dir=(0, 1, 0)), mode=Mode.PRIVATE) as cut_extrude_4_sk2:
        with Locations(Location((8, 13, 0), (0, 0, 270))):
            Circle(SKETCH_8_R)
    cut_extrude_4_tool2 = extrude(cut_extrude_4_sk2.sketch, amount=-CUT_EXTRUDE_4_REACH, mode=Mode.PRIVATE) & part.part
    # ｽｹｯﾁ8 → ｶｯﾄ - 押し出し4 (cut, up to next)
    with BuildSketch(Plane(origin=(0, 33.2, 0), x_dir=(1, 0, 0), z_dir=(0, 1, 0)), mode=Mode.PRIVATE) as cut_extrude_4_sk3:
        with Locations(Location((8, -33, 0), (0, 0, 270))):
            Circle(SKETCH_8_R)
    cut_extrude_4_tool3 = extrude(cut_extrude_4_sk3.sketch, amount=-CUT_EXTRUDE_4_REACH, mode=Mode.PRIVATE) & part.part
    # ｽｹｯﾁ8 → ｶｯﾄ - 押し出し4 (cut, up to next)
    with BuildSketch(Plane(origin=(0, 33.2, 0), x_dir=(1, 0, 0), z_dir=(0, 1, 0)), mode=Mode.PRIVATE) as cut_extrude_4_sk4:
        with Locations(Location((-8, -33, 0), (0, 0, 270))):
            Circle(SKETCH_8_R)
    cut_extrude_4_tool4 = extrude(cut_extrude_4_sk4.sketch, amount=-CUT_EXTRUDE_4_REACH, mode=Mode.PRIVATE) & part.part
    # ｽｹｯﾁ8 → ｶｯﾄ - 押し出し4 (cut, up to next)
    with BuildSketch(Plane(origin=(0, 33.2, 0), x_dir=(1, 0, 0), z_dir=(0, 1, 0)), mode=Mode.PRIVATE) as cut_extrude_4_sk5:
        with Locations((0, 10.5)):
            Rectangle(SKETCH_8_W, SKETCH_8_H)
    cut_extrude_4_tool5 = extrude(cut_extrude_4_sk5.sketch, amount=-CUT_EXTRUDE_4_REACH, mode=Mode.PRIVATE) & part.part
    # ｽｹｯﾁ8 → ｶｯﾄ - 押し出し4 (cut, up to next)
    with BuildSketch(Plane(origin=(0, 33.2, 0), x_dir=(1, 0, 0), z_dir=(0, 1, 0)), mode=Mode.PRIVATE) as cut_extrude_4_sk6:
        with Locations((0, -30.5)):
            Rectangle(SKETCH_8_W, SKETCH_8_H)
    cut_extrude_4_tool6 = extrude(cut_extrude_4_sk6.sketch, amount=-CUT_EXTRUDE_4_REACH, mode=Mode.PRIVATE) & part.part
    add(cut_extrude_4_tool1.solids().sort_by_distance((-8, 33.2, -13))[0], mode=Mode.SUBTRACT)
    add(cut_extrude_4_tool2.solids().sort_by_distance((8, 33.2, -13))[0], mode=Mode.SUBTRACT)
    add(cut_extrude_4_tool3.solids().sort_by_distance((8, 33.2, 33))[0], mode=Mode.SUBTRACT)
    add(cut_extrude_4_tool4.solids().sort_by_distance((-8, 33.2, 33))[0], mode=Mode.SUBTRACT)
    add(cut_extrude_4_tool5.solids().sort_by_distance((0, 33.2, -10.5))[0], mode=Mode.SUBTRACT)
    add(cut_extrude_4_tool6.solids().sort_by_distance((0, 33.2, 30.5))[0], mode=Mode.SUBTRACT)


with BuildPart() as body_2:
    # Split Bodies 1: the piece on the far side of the plane
    add(part.part)
    split(bisect_by=Plane.ZX.offset(29.2), keep=Keep.BOTTOM)


with BuildPart() as part_1:
    add(part.part)

    # Split Bodies 1
    split(bisect_by=Plane.ZX.offset(29.2), keep=Keep.TOP)


with BuildPart() as body_3:
    # Split Bodies 2: the piece on the far side of the plane
    add(body_2.part)
    split(bisect_by=Plane(origin=(0, 0, 0), x_dir=(1, 0, 0), z_dir=(0, 1, 0)), keep=Keep.BOTTOM)


with BuildPart() as body_2_1:
    add(body_2.part)

    # Split Bodies 2
    split(bisect_by=Plane(origin=(0, 0, 0), x_dir=(1, 0, 0), z_dir=(0, 1, 0)), keep=Keep.TOP)


solid = Compound([part_1.part, body_3.part, body_2_1.part])
